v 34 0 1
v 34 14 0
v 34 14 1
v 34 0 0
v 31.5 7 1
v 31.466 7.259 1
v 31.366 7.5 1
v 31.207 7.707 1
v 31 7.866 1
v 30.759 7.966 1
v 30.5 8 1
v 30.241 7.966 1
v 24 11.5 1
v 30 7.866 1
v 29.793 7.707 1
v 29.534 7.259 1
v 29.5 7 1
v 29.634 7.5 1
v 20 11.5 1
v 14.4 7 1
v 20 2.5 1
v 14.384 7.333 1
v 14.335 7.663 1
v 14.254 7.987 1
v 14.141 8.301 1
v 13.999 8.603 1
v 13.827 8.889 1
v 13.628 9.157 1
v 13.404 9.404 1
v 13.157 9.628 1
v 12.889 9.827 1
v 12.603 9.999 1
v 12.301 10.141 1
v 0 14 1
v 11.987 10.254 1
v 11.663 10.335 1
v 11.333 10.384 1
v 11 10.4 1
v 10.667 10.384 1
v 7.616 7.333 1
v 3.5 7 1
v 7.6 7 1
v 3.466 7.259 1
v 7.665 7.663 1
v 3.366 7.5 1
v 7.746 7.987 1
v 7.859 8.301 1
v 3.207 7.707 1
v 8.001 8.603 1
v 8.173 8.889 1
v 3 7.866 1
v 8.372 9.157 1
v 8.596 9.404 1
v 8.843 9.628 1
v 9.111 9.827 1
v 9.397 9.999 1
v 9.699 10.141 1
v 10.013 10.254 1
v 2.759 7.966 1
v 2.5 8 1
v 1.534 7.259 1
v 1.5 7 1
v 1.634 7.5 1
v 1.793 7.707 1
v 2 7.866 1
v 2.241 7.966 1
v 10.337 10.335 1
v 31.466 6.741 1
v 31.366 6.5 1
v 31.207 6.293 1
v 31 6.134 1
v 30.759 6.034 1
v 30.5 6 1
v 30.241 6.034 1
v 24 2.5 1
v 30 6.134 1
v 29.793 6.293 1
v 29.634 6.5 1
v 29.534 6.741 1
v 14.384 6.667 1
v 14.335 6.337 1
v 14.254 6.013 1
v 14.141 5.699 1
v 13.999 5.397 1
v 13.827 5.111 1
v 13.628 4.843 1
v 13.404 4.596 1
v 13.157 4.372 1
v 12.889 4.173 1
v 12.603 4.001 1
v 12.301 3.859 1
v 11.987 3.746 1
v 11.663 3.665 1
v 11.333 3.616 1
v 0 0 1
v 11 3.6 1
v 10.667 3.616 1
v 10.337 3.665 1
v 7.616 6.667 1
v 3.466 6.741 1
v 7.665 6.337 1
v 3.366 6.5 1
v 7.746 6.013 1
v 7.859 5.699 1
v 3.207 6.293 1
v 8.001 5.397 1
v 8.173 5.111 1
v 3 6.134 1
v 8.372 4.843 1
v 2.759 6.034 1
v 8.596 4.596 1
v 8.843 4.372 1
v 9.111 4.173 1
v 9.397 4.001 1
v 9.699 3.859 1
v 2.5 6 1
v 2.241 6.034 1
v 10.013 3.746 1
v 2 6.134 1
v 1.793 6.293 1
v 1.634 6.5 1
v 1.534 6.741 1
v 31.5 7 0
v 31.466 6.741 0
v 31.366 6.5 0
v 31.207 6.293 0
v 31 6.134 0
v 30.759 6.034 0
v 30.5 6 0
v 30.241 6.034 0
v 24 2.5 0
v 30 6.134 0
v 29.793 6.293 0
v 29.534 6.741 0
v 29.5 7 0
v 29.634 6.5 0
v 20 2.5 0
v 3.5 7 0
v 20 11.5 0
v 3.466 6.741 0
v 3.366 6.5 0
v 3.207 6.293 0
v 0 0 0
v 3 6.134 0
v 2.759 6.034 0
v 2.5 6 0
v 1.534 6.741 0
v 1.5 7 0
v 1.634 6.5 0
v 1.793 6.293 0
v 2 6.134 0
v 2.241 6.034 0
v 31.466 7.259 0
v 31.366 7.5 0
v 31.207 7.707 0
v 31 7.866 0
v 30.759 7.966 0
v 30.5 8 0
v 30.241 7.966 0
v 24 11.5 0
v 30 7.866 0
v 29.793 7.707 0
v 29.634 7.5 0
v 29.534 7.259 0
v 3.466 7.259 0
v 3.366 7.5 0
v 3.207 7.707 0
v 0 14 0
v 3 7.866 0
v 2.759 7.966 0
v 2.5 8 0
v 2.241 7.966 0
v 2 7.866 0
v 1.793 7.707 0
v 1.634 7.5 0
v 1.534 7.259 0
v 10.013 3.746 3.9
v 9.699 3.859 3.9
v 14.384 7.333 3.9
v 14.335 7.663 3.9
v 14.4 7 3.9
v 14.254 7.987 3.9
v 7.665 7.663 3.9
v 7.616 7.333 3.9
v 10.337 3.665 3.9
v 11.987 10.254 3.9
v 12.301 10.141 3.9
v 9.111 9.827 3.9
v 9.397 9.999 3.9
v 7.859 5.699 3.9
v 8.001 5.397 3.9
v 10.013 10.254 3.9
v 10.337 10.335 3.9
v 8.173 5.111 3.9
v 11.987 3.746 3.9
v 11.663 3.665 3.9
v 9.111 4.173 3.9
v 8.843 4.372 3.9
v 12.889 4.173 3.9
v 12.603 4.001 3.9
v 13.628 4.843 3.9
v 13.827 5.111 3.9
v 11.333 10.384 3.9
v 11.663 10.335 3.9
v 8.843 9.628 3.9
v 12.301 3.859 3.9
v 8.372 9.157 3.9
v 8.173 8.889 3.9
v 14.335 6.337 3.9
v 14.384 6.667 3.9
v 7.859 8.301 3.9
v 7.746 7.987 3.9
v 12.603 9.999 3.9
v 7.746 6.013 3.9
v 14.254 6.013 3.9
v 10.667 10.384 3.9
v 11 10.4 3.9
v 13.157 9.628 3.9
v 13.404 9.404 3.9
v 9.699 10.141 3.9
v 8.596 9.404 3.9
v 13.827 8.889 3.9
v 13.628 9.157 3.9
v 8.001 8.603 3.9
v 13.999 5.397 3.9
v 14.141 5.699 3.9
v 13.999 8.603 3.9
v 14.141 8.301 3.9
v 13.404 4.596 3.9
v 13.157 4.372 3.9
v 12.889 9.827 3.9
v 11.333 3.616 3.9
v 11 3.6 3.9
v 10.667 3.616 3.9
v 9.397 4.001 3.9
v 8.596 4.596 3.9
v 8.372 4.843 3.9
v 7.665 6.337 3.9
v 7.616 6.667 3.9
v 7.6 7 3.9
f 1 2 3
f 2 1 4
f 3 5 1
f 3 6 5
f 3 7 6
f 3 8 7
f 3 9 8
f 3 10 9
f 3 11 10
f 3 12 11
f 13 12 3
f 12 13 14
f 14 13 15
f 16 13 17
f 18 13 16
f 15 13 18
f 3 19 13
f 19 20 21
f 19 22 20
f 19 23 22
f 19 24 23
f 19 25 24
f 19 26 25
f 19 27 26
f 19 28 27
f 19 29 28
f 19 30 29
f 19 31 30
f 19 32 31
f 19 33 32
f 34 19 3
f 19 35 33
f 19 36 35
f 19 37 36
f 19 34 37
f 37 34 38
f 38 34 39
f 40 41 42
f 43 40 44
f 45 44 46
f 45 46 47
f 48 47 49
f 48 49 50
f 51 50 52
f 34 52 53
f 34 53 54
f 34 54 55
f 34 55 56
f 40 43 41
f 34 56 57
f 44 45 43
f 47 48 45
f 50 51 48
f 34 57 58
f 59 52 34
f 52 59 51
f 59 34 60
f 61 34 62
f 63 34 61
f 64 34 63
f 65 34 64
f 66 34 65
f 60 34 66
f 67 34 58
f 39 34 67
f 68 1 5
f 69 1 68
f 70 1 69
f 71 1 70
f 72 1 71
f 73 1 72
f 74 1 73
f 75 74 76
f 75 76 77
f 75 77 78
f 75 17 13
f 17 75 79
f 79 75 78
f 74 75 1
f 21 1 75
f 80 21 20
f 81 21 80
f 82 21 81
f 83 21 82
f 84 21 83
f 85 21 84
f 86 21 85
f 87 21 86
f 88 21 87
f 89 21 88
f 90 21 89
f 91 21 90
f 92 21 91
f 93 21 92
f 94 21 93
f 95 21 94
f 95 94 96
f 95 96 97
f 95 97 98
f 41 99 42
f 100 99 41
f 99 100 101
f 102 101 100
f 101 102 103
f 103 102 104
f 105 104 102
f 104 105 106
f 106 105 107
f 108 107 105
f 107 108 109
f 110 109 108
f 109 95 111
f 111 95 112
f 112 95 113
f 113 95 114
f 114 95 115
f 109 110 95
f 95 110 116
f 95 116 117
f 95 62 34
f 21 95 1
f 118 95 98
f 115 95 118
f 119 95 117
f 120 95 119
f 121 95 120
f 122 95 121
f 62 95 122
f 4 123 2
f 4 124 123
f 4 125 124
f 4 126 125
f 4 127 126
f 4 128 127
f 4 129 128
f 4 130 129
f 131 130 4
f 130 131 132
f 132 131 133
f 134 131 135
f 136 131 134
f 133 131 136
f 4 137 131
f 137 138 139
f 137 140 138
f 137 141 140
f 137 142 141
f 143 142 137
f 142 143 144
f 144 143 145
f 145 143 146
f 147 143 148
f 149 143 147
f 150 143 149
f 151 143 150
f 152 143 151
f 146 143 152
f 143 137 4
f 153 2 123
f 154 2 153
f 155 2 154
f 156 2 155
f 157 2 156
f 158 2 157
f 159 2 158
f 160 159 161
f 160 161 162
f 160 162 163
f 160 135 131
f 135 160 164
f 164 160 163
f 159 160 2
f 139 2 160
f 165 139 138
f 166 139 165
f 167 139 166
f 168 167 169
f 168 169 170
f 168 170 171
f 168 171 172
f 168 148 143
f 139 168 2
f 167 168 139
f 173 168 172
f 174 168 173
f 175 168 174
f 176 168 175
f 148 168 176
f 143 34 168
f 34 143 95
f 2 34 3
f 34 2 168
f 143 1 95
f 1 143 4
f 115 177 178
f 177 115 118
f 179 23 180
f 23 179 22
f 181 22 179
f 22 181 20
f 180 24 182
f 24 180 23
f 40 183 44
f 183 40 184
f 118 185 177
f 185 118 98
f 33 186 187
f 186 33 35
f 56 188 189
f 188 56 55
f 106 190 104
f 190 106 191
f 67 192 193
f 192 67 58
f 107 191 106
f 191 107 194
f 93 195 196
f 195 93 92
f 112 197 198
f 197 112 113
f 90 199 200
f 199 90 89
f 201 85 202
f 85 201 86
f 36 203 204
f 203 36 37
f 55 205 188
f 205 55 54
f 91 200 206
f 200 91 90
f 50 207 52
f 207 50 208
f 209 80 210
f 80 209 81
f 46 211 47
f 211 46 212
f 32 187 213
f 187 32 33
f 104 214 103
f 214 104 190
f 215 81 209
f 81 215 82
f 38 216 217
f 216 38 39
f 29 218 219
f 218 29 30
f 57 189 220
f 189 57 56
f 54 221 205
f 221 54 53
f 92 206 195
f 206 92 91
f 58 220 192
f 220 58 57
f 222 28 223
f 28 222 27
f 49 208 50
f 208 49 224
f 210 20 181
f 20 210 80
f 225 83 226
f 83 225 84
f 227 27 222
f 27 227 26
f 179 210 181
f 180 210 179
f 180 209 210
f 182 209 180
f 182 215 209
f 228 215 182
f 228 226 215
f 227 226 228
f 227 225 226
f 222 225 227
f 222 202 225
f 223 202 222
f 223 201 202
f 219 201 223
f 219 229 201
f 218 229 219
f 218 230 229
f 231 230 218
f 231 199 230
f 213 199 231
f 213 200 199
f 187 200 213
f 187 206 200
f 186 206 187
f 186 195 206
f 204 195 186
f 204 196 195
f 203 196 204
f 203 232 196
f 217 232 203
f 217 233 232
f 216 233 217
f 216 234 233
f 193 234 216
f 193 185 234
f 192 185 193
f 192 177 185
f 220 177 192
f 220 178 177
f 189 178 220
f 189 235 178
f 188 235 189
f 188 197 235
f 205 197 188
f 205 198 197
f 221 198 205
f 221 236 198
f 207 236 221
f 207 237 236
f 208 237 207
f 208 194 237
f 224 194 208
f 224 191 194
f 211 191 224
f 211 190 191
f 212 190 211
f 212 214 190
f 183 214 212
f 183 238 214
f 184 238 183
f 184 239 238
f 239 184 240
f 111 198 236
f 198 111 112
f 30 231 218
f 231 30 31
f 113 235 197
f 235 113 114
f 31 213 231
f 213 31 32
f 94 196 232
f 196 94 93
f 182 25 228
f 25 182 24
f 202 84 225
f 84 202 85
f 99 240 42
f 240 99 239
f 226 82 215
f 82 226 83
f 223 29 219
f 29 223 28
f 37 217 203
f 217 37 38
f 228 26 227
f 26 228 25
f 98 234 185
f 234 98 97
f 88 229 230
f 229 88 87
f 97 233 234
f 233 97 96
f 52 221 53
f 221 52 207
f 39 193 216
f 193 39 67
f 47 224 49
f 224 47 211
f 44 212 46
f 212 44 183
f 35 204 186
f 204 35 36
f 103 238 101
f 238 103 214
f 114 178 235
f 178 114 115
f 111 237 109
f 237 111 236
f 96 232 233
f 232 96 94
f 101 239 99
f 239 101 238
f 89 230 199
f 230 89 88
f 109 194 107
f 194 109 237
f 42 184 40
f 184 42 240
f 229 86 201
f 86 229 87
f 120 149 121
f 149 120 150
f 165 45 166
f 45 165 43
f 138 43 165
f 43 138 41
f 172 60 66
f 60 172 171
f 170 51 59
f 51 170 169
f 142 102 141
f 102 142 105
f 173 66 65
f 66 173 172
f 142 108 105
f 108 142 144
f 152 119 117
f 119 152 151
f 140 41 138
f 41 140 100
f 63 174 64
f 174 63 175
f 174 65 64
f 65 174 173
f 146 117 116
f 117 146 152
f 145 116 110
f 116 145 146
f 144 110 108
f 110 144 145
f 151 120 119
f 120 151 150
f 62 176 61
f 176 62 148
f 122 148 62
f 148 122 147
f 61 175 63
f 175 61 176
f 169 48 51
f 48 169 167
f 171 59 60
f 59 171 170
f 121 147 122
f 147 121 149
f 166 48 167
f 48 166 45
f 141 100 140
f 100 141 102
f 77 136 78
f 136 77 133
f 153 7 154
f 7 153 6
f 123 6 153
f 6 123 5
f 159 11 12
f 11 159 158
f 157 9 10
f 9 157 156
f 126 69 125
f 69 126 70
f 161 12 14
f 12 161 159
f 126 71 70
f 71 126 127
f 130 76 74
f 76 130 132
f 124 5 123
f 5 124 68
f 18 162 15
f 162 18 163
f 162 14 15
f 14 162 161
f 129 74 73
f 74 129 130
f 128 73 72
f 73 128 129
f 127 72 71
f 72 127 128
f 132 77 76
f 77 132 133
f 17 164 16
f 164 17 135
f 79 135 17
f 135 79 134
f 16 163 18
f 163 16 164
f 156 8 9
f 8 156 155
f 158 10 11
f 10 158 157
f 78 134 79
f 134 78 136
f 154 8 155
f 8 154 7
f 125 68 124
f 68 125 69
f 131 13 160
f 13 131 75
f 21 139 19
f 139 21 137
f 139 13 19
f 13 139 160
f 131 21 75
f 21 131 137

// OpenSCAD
// file: servo_9g.scad
//servo_9g(false);

//use<hub_mount.scad>
use<MCAD/nuts_and_bolts.scad>
$fn = 24;
//x,y,z => l,w,h
servo_l         = 12;
servo_w         = 23;
body_h          = 23;

servo_h         = 27; //not used in code

wing_w          = 5;
wing_h          = 2.33;
wing_place      = 18.3;   
hole_offset     = 2.5;    //not checked
mount_hole_r    = 2/2;
mount_slot      = 1;

servo_ww        = servo_w+wing_w*2; // not used in code but is handy number

hub_h           = 4;
small_hub_r     = 5.68/2;  
horn_r          = 4.66/2;
horn_h          = 3;

wire_l          = 4;
wire_w          = 1.5;
wire_h          = 1;
wire_place      = 4.8;

servo_full_w    = servo_w+wing_w*2;

//servo_9g(true, false);
module servo_9g(hole=false, wings = true) {
    //if a differnce is applied and you want 
    if(hole) {
        translate([servo_l/2,-hole_offset,-10]) 
        cylinder(r=mount_hole_r,h=40);
        translate([servo_l/2,hole_offset+servo_w,-10]) 
        cylinder(r=mount_hole_r,h=40);
        /*translate([servo_l/2,servo_l/2,-15])
        cylinder(r=1.5,h=15);*/
        
        /*translate([servo_l/2,servo_l/2,body_h+hub_h+5])
        #hub_mount();*/
    }
    color("white") translate([servo_l/2,servo_l/2,body_h+hub_h])
    cylinder(r=horn_r,h=horn_h);
    
    color("deepSkyBlue",.7) 
    union() {
        cube([servo_l,servo_w,body_h]);
        translate([servo_l/2,servo_l/2,body_h])
        cylinder(r=servo_l/2,h=hub_h);
        translate([servo_l/2,servo_l+small_hub_r/2,body_h])
        cylinder(r=small_hub_r,h=hub_h);
        
        if(wings) {
            translate([0,servo_w,wing_place])
            difference() {
                cube([servo_l,wing_w,wing_h]);
                translate([servo_l/2,hole_offset,0]) 
                cylinder(r=mount_hole_r,h=5);
                translate([servo_l/2-mount_slot/2,hole_offset+mount_hole_r/2,0])
                if(hole) cube([mount_slot,4,3]);
            }
        
            translate([servo_l,0,wing_place])
            rotate([0,0,180])
            difference() {
                cube([servo_l,wing_w,wing_h]);
                translate([servo_l/2,hole_offset,0]) 
                cylinder(r=mount_hole_r,h=5);
                translate([servo_l/2-mount_slot/2,hole_offset+mount_hole_r/2,0])
                if(hole) cube([mount_slot,4,3]);
            }
        }
    }
    
    /*color("brown") translate([(servo_l-wire_l)/2,-wire_w,wire_place])
    cube([wire_l,wire_w,wire_h]);*/
}
// main file
include<servo_9g.scad>

//No bearing will print the shaft to the bearing diameter
bearing = false;
radius = bearing ? 1.84 : 3.4;

difference() {
        union() {
            cube([34,14,1]);
            translate([servo_l/2+hole_offset*2,7,1])
            cylinder(r=radius,h=2.9, $fn = 64);
        }
        translate([hole_offset,7,-10]) 
        cylinder(r=mount_hole_r,h=40);
        translate([hole_offset*3+servo_w,7,-10]) 
        cylinder(r=mount_hole_r,h=40);
        
        //Wire Slot
        translate([20,2.5,-.5])
        cube([4,9,2]);
}
